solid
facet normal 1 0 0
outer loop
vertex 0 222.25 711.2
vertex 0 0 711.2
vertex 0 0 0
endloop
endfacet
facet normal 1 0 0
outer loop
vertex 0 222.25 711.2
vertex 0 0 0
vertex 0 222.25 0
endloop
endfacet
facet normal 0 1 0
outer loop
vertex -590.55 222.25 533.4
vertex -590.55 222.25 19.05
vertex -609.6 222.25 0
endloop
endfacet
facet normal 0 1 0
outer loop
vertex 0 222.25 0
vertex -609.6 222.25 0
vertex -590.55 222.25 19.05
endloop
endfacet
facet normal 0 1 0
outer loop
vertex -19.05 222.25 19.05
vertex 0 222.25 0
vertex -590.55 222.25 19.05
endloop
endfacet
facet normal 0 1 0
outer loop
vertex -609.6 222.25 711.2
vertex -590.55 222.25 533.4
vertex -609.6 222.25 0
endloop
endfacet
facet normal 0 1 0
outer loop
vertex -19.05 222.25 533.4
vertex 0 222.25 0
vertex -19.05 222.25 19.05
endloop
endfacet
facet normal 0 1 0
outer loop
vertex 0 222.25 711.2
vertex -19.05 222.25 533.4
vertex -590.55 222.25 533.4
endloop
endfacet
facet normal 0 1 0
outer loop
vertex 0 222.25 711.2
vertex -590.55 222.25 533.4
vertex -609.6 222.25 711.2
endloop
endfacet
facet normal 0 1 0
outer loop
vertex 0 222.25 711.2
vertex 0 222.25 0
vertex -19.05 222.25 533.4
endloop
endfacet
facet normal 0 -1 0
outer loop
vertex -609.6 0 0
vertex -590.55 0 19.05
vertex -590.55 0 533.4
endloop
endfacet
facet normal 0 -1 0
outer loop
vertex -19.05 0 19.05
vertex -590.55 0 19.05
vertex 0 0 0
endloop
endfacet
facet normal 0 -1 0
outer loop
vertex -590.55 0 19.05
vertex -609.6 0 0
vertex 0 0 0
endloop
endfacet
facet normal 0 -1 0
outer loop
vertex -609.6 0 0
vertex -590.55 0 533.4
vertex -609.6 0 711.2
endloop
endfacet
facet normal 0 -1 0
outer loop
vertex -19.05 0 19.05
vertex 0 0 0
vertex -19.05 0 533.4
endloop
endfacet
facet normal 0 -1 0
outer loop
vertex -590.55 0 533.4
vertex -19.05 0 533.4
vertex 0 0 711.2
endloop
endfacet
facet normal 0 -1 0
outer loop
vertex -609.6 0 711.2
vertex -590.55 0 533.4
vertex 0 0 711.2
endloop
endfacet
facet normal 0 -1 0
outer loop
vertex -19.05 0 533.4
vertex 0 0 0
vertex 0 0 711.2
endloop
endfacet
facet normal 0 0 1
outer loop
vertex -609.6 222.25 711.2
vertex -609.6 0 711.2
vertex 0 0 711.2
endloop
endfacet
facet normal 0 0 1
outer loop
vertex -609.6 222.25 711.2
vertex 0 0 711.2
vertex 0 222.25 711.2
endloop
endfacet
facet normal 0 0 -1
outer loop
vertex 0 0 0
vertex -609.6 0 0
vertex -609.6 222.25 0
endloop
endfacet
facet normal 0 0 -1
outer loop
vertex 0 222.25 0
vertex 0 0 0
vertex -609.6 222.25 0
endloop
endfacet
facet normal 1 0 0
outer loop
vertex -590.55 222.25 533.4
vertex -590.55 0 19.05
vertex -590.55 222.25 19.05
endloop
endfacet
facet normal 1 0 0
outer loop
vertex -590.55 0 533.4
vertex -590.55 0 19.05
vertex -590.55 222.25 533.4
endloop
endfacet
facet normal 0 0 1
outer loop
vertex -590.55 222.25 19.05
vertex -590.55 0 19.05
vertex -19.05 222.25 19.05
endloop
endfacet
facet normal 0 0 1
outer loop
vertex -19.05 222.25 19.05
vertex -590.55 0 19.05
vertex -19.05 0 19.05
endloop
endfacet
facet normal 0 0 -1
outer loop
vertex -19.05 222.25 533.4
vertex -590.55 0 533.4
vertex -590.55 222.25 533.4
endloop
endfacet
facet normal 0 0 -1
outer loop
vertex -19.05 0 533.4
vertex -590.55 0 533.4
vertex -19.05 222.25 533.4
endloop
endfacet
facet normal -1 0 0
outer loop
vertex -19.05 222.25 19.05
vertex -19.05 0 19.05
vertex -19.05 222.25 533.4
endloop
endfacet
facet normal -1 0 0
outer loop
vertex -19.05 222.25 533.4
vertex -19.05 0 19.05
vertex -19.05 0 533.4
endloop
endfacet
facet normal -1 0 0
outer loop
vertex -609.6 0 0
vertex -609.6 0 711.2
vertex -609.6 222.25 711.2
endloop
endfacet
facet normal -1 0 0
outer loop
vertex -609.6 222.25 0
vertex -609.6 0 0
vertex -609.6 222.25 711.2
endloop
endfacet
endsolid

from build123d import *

# Parameters (mm, degrees)
F0_W     = 222.25
F0_H     = 711.2
F1_DEPTH = 609.6
F2_W     = 571.5
F2_H     = 514.35
F3_DEPTH = 285.75
F4_W     = 571.5
F4_H     = 63.5
F5_DEPTH = 158.75


with BuildPart() as f1:
    # F0 (on Right) → F1 (new body)
    with BuildSketch(Plane.YZ):
        with Locations((111.125, 355.6)):
            Rectangle(F0_W, F0_H)
    extrude(amount=-F1_DEPTH)

    # F2 (on face) → F3 (cut)
    with BuildSketch(Plane.XZ):
        with Locations((-304.8, 276.225)):
            Rectangle(F2_W, F2_H)
    extrude(amount=-F3_DEPTH, mode=Mode.SUBTRACT)

    # F4 (on face) → F5 (cut)
    with BuildSketch(Plane(origin=(0, 0, 533.4), x_dir=(1, 0, 0), z_dir=(0, 0, -1))):
        with Locations((-304.8, -254)):
            Rectangle(F4_W, F4_H)
    extrude(amount=-F5_DEPTH, mode=Mode.SUBTRACT)


solid = f1.part
